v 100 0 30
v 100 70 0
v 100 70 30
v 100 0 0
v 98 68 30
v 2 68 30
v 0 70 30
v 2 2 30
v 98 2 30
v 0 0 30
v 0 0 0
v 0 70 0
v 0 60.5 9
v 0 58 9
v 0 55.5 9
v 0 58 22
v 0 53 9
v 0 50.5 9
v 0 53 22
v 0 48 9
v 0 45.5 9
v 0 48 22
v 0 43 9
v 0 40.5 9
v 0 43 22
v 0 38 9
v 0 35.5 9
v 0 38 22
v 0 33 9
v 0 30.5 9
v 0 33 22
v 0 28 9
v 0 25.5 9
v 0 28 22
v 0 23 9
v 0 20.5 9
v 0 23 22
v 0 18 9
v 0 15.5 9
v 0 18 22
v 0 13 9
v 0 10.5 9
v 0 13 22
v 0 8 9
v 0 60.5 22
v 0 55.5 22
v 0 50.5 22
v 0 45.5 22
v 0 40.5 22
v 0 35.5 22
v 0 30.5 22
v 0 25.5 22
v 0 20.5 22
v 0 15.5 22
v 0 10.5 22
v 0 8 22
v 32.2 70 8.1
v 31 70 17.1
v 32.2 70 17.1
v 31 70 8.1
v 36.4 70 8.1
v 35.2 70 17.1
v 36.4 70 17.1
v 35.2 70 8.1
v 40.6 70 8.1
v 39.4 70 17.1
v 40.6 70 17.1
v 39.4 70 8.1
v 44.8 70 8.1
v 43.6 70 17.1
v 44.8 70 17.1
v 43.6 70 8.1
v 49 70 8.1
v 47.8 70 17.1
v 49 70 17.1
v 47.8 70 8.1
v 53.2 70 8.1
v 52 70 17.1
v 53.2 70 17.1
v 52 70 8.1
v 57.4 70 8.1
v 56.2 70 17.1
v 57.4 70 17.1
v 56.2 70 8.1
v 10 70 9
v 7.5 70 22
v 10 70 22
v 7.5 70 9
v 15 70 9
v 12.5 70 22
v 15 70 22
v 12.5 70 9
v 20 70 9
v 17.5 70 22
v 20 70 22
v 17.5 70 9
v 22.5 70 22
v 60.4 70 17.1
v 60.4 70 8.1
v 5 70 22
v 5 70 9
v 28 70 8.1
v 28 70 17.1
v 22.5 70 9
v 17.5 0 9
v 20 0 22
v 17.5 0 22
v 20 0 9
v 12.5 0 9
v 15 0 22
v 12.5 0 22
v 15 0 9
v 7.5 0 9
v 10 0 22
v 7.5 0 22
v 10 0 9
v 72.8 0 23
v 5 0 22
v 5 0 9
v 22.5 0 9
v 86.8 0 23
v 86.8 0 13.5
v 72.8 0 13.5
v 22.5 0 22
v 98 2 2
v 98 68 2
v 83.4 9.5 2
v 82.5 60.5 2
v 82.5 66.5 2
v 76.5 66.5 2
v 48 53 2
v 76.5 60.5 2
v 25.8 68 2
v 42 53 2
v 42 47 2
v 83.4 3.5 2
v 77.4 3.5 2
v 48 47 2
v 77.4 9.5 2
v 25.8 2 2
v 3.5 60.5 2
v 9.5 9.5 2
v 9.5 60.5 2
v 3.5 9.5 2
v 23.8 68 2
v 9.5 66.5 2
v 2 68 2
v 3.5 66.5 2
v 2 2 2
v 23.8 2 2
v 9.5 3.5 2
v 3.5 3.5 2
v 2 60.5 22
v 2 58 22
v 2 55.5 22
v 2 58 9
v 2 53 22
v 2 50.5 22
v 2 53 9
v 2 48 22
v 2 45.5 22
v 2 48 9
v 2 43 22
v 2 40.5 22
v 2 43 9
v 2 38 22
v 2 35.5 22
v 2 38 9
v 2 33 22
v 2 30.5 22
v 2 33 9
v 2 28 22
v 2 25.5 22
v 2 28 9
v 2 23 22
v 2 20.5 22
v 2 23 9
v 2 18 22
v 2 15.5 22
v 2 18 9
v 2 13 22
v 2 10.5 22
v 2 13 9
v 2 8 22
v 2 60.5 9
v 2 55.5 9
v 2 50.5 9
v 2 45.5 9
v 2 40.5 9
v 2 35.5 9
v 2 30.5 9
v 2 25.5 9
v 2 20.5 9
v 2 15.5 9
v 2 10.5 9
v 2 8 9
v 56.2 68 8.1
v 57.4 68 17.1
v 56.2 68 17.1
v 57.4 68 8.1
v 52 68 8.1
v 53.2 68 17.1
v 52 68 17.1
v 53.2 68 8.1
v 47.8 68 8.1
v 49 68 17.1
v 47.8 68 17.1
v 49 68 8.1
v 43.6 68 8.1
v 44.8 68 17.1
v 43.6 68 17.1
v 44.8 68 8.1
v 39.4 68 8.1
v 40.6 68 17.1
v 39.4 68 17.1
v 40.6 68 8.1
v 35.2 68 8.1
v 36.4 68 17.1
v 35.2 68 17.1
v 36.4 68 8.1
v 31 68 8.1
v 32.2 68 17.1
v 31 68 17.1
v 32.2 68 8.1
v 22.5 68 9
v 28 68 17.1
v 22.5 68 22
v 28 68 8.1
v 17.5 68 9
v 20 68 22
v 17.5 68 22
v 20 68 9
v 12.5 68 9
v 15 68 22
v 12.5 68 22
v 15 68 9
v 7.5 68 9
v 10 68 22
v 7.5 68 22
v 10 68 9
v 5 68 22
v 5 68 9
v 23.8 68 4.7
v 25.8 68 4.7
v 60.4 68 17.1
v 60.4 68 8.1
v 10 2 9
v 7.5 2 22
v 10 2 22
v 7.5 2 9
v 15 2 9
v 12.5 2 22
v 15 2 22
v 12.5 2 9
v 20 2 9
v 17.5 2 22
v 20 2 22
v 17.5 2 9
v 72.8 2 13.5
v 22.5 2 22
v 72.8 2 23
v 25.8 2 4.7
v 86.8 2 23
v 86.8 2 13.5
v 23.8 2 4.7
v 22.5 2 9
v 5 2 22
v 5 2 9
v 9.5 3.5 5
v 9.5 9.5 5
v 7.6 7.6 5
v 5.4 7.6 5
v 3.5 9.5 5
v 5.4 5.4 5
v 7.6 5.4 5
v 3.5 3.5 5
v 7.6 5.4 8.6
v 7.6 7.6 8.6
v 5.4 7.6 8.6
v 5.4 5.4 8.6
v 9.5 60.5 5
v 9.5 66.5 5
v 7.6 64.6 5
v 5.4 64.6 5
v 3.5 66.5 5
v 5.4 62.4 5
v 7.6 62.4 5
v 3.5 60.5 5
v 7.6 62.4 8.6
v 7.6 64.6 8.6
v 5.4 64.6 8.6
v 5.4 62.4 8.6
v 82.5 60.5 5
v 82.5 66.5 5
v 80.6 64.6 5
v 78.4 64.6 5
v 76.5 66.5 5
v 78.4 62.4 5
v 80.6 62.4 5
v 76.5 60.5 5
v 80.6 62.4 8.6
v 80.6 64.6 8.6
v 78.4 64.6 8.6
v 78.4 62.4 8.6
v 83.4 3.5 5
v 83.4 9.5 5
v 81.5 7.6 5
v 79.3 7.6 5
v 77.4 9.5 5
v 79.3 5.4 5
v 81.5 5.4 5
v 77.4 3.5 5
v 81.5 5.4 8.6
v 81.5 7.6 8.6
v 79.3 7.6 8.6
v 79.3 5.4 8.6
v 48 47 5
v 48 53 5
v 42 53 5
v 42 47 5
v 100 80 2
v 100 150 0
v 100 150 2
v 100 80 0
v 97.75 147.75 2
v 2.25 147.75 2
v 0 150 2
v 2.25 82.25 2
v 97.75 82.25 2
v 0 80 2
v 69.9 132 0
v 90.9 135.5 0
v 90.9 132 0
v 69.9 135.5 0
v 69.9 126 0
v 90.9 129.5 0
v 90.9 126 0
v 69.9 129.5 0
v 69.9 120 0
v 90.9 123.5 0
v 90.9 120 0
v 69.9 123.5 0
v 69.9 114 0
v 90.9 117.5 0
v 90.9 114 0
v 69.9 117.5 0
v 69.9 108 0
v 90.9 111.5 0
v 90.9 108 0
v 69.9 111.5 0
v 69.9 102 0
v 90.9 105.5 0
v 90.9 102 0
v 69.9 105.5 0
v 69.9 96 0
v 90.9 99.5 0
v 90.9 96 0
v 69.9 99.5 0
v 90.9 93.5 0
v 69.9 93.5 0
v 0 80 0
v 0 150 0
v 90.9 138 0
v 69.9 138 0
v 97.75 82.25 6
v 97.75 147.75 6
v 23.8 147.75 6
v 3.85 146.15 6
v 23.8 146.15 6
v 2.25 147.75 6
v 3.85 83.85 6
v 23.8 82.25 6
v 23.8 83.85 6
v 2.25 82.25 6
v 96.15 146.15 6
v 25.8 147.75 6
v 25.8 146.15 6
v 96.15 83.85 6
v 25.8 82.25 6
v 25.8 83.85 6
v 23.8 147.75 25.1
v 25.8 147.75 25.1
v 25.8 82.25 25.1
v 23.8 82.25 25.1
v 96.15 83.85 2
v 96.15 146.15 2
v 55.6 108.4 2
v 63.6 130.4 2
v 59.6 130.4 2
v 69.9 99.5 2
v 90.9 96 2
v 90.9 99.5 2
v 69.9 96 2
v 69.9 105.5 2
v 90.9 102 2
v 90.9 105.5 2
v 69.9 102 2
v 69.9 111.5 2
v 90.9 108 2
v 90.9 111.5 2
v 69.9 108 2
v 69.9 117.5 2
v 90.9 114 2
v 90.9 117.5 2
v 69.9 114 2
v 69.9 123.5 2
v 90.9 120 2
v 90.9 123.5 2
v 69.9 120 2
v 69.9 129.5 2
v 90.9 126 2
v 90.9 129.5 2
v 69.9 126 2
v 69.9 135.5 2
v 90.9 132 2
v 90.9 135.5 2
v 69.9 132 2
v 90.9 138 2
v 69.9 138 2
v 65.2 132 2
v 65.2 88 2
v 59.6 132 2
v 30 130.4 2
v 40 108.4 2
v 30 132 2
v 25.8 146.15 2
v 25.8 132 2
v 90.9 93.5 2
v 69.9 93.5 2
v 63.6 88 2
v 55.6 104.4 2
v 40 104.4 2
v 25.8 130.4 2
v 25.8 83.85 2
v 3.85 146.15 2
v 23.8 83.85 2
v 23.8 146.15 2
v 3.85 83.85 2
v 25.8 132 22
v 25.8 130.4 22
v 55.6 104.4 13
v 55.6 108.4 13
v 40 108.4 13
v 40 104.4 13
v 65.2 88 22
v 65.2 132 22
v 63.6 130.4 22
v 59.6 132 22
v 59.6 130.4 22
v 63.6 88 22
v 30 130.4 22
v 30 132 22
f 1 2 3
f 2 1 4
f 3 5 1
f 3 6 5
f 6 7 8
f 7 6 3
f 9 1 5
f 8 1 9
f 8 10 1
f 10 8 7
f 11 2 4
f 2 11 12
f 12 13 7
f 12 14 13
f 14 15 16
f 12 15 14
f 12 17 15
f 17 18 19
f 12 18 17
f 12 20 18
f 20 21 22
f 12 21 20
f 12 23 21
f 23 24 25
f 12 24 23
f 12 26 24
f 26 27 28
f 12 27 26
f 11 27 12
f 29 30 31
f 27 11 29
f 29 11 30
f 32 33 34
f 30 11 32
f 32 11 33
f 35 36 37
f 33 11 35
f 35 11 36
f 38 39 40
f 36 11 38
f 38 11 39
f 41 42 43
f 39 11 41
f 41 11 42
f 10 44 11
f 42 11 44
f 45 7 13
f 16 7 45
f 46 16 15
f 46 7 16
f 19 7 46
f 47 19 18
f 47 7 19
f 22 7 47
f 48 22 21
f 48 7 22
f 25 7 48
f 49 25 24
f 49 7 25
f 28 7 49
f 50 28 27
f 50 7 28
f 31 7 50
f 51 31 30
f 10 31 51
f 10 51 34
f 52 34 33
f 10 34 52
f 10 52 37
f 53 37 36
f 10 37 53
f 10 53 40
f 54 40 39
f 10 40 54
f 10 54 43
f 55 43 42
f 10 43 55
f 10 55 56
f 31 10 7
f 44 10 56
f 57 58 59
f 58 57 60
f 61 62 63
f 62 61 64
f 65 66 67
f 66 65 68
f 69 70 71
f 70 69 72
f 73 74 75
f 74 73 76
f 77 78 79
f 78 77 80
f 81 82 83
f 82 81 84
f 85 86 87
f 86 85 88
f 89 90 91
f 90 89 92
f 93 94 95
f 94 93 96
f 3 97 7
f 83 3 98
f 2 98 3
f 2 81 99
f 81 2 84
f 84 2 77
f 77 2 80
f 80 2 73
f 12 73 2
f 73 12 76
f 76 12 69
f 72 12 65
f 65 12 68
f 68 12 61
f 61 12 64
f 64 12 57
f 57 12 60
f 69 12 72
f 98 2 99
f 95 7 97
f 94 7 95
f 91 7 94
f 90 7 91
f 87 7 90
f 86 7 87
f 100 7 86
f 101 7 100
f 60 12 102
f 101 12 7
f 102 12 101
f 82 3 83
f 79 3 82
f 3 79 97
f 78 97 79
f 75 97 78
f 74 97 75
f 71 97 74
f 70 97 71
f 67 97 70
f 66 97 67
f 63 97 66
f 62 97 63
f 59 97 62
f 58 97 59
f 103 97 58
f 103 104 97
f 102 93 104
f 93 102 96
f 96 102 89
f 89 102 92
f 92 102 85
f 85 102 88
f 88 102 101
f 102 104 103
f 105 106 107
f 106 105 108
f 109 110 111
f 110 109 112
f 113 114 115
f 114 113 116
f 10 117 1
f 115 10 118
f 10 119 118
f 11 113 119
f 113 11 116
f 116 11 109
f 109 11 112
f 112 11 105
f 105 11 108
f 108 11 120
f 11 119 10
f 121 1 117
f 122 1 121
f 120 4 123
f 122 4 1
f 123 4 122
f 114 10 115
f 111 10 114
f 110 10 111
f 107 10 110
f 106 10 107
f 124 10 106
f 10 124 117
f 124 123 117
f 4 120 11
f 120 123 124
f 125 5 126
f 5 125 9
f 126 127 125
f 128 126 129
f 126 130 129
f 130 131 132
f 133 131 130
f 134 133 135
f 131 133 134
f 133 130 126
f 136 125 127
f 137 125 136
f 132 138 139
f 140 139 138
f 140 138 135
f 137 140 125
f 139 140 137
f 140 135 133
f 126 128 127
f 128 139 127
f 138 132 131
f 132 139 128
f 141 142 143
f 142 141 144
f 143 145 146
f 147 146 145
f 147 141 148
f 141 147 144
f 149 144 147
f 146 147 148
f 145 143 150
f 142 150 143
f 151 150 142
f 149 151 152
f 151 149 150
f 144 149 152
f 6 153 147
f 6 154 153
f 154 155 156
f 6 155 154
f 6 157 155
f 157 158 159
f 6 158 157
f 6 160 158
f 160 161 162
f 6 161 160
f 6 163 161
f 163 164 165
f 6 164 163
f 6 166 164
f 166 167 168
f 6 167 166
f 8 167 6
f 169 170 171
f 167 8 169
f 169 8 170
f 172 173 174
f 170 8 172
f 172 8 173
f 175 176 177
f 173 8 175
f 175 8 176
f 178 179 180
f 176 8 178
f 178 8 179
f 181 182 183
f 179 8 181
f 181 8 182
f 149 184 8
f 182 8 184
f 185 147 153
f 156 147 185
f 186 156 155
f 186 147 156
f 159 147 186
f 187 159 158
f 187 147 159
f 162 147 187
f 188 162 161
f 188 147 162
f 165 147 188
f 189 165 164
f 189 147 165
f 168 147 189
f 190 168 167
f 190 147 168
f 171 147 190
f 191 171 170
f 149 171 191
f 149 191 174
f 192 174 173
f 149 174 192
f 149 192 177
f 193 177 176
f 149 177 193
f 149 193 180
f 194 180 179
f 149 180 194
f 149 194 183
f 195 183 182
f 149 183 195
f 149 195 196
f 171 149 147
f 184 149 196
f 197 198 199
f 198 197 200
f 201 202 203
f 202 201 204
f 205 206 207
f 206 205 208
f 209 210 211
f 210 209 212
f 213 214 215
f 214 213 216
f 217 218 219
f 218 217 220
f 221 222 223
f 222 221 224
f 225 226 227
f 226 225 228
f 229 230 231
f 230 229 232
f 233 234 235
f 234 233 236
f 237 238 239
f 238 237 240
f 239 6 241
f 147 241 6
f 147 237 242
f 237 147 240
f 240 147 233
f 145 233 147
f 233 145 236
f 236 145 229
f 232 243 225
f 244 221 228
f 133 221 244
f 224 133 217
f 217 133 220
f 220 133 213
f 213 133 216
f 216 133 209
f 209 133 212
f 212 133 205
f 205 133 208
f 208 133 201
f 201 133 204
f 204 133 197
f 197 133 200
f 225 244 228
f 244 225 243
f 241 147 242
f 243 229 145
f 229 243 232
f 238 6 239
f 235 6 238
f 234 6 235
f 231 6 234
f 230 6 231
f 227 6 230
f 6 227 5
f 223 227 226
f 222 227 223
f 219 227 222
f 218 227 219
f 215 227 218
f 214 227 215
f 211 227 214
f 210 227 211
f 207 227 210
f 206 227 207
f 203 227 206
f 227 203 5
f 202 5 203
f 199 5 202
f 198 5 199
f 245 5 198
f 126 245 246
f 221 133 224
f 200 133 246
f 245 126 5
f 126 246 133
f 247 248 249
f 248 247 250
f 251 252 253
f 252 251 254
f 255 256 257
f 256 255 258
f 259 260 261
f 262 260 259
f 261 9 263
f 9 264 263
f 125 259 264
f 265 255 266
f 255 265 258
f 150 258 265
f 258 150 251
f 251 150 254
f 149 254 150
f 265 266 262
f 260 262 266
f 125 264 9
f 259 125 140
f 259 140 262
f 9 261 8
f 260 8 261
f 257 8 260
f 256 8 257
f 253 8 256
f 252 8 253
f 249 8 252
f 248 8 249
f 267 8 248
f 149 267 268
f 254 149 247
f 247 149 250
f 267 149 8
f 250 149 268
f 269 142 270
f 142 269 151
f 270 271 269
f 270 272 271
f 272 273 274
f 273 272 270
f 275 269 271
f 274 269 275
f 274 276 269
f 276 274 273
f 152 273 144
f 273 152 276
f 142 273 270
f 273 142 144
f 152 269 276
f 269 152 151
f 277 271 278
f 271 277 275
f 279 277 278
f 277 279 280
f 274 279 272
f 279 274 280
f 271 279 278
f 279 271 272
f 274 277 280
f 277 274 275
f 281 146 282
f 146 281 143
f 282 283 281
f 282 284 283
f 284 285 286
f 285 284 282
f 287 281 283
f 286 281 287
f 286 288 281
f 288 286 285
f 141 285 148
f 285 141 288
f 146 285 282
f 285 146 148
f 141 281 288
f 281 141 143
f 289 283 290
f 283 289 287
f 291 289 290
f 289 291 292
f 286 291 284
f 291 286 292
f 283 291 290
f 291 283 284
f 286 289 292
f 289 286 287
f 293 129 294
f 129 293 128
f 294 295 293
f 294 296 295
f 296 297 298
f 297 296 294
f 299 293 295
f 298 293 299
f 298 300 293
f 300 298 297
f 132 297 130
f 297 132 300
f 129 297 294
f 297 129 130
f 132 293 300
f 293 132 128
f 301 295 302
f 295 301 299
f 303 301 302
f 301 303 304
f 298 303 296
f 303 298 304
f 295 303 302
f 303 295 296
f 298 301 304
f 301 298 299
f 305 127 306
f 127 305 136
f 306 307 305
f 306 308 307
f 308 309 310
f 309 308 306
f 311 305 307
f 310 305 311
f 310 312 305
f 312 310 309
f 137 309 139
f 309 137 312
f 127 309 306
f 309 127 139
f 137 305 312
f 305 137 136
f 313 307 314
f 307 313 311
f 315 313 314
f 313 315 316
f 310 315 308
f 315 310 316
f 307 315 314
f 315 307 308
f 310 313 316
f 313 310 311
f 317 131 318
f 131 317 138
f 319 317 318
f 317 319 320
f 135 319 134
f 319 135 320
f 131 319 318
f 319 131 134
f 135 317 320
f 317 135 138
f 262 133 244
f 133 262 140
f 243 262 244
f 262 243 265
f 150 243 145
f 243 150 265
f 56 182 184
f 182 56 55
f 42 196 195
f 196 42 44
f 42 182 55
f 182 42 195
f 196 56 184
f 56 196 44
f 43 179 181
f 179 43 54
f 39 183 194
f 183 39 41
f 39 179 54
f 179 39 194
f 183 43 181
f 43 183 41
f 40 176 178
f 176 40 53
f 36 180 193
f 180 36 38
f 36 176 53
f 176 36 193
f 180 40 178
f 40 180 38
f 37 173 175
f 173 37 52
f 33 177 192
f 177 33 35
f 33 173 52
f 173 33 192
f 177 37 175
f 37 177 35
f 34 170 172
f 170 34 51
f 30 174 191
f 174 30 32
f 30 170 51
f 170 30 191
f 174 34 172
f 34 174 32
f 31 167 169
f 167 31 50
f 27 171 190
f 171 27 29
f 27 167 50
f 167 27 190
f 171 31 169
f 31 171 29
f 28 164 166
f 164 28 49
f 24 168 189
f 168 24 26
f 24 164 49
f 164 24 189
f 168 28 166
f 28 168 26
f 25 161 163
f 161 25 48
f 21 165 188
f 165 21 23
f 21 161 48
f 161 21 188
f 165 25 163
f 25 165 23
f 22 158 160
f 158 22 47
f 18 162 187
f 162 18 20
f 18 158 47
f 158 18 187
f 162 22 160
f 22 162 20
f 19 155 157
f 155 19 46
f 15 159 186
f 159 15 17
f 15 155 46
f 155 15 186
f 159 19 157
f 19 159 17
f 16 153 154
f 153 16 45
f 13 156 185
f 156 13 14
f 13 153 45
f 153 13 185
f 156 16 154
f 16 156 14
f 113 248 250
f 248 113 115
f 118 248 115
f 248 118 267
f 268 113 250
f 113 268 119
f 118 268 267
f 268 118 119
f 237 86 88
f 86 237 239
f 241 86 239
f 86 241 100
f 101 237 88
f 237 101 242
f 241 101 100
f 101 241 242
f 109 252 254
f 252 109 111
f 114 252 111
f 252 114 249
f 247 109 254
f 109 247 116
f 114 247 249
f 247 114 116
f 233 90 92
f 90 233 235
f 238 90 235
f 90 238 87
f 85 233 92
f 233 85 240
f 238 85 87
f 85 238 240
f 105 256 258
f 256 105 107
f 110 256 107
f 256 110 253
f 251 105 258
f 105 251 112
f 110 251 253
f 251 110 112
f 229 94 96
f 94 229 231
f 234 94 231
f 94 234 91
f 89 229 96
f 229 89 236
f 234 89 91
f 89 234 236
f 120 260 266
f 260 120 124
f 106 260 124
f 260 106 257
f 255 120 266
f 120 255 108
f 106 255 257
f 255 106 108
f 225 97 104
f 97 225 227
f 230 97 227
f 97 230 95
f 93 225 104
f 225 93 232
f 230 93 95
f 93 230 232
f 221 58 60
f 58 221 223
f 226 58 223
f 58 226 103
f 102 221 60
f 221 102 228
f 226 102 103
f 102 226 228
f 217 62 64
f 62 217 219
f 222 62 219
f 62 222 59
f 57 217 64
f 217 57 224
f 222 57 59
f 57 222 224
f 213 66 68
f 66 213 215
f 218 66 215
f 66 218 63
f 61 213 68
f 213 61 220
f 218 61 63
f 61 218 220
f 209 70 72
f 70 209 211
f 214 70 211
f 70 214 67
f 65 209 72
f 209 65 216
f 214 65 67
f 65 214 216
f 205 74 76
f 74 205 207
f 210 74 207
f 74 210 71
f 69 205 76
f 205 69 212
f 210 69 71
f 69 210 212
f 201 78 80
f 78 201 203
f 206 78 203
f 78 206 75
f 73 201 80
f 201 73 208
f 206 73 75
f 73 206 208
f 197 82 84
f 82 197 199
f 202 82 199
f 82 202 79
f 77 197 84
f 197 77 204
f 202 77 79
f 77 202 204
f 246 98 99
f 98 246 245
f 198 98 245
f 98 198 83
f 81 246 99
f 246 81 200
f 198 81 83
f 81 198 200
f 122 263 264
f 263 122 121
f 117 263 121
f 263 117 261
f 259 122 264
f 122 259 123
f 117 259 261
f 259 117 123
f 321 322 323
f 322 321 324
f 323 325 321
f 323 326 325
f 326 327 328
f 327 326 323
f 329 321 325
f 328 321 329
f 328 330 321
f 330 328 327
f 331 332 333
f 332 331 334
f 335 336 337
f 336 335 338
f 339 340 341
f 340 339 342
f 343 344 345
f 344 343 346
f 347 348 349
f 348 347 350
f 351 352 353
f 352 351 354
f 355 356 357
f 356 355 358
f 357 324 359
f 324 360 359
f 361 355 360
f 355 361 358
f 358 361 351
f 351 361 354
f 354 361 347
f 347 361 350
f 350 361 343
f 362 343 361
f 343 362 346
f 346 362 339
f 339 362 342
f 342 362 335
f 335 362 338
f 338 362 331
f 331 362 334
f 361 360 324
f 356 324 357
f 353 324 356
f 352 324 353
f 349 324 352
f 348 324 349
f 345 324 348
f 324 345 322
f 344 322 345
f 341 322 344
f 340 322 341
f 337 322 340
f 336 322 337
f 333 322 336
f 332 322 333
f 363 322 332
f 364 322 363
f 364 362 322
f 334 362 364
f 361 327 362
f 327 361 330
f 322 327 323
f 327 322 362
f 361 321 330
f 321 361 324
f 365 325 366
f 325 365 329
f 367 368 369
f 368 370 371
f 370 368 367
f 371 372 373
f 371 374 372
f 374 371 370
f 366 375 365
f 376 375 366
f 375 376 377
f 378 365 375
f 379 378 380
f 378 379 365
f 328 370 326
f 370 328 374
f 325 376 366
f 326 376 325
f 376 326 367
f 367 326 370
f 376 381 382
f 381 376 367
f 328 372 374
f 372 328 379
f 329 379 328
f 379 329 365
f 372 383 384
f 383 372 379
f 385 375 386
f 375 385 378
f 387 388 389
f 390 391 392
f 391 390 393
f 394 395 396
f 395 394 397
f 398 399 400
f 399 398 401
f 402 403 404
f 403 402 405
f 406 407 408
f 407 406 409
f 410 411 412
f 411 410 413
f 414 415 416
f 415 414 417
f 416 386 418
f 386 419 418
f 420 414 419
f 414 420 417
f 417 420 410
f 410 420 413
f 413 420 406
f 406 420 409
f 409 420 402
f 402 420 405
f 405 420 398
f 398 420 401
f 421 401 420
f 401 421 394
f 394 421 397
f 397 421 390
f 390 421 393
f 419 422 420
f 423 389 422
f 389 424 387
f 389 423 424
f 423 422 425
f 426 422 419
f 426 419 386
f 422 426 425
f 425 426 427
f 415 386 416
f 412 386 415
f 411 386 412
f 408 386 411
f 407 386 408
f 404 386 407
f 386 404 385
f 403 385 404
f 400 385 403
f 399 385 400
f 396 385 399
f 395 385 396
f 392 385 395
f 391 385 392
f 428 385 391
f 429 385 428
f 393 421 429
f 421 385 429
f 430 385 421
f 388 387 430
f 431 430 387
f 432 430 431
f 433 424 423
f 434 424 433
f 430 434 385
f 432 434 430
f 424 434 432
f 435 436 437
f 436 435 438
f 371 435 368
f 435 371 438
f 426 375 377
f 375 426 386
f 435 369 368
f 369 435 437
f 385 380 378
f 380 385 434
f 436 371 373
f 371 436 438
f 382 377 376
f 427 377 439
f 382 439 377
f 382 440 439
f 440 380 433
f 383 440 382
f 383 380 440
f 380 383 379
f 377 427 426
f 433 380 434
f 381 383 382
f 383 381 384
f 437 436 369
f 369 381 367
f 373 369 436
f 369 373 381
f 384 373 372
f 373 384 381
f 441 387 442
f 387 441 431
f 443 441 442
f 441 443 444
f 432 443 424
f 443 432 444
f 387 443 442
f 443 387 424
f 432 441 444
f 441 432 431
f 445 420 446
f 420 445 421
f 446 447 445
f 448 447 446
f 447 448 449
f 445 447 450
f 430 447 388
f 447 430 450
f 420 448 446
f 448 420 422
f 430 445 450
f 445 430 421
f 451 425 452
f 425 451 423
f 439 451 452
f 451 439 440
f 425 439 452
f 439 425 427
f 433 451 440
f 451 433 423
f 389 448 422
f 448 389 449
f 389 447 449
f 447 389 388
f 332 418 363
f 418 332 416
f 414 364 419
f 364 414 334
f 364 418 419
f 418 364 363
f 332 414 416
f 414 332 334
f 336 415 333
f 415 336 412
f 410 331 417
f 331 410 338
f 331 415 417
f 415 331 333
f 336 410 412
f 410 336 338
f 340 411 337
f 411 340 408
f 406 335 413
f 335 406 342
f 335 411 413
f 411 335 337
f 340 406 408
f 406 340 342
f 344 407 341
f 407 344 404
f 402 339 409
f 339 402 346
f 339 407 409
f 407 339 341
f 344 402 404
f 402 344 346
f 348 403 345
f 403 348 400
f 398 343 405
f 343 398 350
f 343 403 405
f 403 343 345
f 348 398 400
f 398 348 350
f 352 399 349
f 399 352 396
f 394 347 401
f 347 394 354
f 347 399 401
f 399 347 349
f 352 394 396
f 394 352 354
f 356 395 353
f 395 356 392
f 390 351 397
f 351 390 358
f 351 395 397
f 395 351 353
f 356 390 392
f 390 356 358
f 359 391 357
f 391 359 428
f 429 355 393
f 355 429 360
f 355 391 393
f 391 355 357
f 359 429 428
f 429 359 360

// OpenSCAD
// Generated by enclosure.py - edit the parameters there, or tweak the boxes here.
// Outer size: 100 x 70 x 32 mm

module body() {
difference() {
difference() {
difference() {
difference() {
difference() {
difference() {
difference() {
difference() {
difference() {
difference() {
difference() {
difference() {
difference() {
difference() {
difference() {
difference() {
difference() {
difference() {
difference() {
difference() {
difference() {
difference() {
difference() {
difference() {
difference() {
difference() {
difference() {
difference() {
union() {
union() {
union() {
union() {
union() {
union() {
union() {
union() {
union() {
union() {
difference() {
translate([0,0,0]) cube([100,70,30]);
translate([2,2,2]) cube([96,66,29]);
}
translate([3.5,3.5,2]) cube([6,6,3]);
}
translate([5.4,5.4,2]) cube([2.2,2.2,6.6]);
}
translate([3.5,60.5,2]) cube([6,6,3]);
}
translate([5.4,62.4,2]) cube([2.2,2.2,6.6]);
}
translate([76.5,60.5,2]) cube([6,6,3]);
}
translate([78.4,62.4,2]) cube([2.2,2.2,6.6]);
}
translate([77.4,3.5,2]) cube([6,6,3]);
}
translate([79.3,5.4,2]) cube([2.2,2.2,6.6]);
}
translate([42,47,2]) cube([6,6,3]);
}
translate([23.8,2,2]) cube([2,66,2.7]);
}
translate([-1,8,9]) cube([3.5,2.5,13]);
}
translate([-1,13,9]) cube([3.5,2.5,13]);
}
translate([-1,18,9]) cube([3.5,2.5,13]);
}
translate([-1,23,9]) cube([3.5,2.5,13]);
}
translate([-1,28,9]) cube([3.5,2.5,13]);
}
translate([-1,33,9]) cube([3.5,2.5,13]);
}
translate([-1,38,9]) cube([3.5,2.5,13]);
}
translate([-1,43,9]) cube([3.5,2.5,13]);
}
translate([-1,48,9]) cube([3.5,2.5,13]);
}
translate([-1,53,9]) cube([3.5,2.5,13]);
}
translate([-1,58,9]) cube([3.5,2.5,13]);
}
translate([5,-1,9]) cube([2.5,3.5,13]);
}
translate([5,67.5,9]) cube([2.5,3.5,13]);
}
translate([10,-1,9]) cube([2.5,3.5,13]);
}
translate([10,67.5,9]) cube([2.5,3.5,13]);
}
translate([15,-1,9]) cube([2.5,3.5,13]);
}
translate([15,67.5,9]) cube([2.5,3.5,13]);
}
translate([20,-1,9]) cube([2.5,3.5,13]);
}
translate([20,67.5,9]) cube([2.5,3.5,13]);
}
translate([28,67.5,8.1]) cube([3,3.5,9]);
}
translate([32.2,67.5,8.1]) cube([3,3.5,9]);
}
translate([36.4,67.5,8.1]) cube([3,3.5,9]);
}
translate([40.6,67.5,8.1]) cube([3,3.5,9]);
}
translate([44.8,67.5,8.1]) cube([3,3.5,9]);
}
translate([49,67.5,8.1]) cube([3,3.5,9]);
}
translate([53.2,67.5,8.1]) cube([3,3.5,9]);
}
translate([57.4,67.5,8.1]) cube([3,3.5,9]);
}
translate([72.8,-1,13.5]) cube([14,3.5,9.5]);
}
}

module lid() {
difference() {
difference() {
difference() {
difference() {
difference() {
difference() {
difference() {
difference() {
union() {
union() {
union() {
union() {
union() {
difference() {
union() {
translate([0,0,0]) cube([100,70,2]);
translate([2.25,2.25,2]) cube([95.5,65.5,4]);
}
translate([3.85,3.85,2]) cube([92.3,62.3,5]);
}
translate([23.8,2.25,2]) cube([2,65.5,23.1]);
}
translate([40,24.4,2]) cube([15.6,4,11]);
}
translate([63.6,8,2]) cube([1.6,44,20]);
}
translate([25.8,50.4,2]) cube([4.2,1.6,20]);
}
translate([59.6,50.4,2]) cube([5.6,1.6,20]);
}
translate([69.9,55.5,-1]) cube([21,2.5,3.5]);
}
translate([69.9,49.5,-1]) cube([21,2.5,3.5]);
}
translate([69.9,43.5,-1]) cube([21,2.5,3.5]);
}
translate([69.9,37.5,-1]) cube([21,2.5,3.5]);
}
translate([69.9,31.5,-1]) cube([21,2.5,3.5]);
}
translate([69.9,25.5,-1]) cube([21,2.5,3.5]);
}
translate([69.9,19.5,-1]) cube([21,2.5,3.5]);
}
translate([69.9,13.5,-1]) cube([21,2.5,3.5]);
}
}

body();
translate([0, 80, 0]) lid();
